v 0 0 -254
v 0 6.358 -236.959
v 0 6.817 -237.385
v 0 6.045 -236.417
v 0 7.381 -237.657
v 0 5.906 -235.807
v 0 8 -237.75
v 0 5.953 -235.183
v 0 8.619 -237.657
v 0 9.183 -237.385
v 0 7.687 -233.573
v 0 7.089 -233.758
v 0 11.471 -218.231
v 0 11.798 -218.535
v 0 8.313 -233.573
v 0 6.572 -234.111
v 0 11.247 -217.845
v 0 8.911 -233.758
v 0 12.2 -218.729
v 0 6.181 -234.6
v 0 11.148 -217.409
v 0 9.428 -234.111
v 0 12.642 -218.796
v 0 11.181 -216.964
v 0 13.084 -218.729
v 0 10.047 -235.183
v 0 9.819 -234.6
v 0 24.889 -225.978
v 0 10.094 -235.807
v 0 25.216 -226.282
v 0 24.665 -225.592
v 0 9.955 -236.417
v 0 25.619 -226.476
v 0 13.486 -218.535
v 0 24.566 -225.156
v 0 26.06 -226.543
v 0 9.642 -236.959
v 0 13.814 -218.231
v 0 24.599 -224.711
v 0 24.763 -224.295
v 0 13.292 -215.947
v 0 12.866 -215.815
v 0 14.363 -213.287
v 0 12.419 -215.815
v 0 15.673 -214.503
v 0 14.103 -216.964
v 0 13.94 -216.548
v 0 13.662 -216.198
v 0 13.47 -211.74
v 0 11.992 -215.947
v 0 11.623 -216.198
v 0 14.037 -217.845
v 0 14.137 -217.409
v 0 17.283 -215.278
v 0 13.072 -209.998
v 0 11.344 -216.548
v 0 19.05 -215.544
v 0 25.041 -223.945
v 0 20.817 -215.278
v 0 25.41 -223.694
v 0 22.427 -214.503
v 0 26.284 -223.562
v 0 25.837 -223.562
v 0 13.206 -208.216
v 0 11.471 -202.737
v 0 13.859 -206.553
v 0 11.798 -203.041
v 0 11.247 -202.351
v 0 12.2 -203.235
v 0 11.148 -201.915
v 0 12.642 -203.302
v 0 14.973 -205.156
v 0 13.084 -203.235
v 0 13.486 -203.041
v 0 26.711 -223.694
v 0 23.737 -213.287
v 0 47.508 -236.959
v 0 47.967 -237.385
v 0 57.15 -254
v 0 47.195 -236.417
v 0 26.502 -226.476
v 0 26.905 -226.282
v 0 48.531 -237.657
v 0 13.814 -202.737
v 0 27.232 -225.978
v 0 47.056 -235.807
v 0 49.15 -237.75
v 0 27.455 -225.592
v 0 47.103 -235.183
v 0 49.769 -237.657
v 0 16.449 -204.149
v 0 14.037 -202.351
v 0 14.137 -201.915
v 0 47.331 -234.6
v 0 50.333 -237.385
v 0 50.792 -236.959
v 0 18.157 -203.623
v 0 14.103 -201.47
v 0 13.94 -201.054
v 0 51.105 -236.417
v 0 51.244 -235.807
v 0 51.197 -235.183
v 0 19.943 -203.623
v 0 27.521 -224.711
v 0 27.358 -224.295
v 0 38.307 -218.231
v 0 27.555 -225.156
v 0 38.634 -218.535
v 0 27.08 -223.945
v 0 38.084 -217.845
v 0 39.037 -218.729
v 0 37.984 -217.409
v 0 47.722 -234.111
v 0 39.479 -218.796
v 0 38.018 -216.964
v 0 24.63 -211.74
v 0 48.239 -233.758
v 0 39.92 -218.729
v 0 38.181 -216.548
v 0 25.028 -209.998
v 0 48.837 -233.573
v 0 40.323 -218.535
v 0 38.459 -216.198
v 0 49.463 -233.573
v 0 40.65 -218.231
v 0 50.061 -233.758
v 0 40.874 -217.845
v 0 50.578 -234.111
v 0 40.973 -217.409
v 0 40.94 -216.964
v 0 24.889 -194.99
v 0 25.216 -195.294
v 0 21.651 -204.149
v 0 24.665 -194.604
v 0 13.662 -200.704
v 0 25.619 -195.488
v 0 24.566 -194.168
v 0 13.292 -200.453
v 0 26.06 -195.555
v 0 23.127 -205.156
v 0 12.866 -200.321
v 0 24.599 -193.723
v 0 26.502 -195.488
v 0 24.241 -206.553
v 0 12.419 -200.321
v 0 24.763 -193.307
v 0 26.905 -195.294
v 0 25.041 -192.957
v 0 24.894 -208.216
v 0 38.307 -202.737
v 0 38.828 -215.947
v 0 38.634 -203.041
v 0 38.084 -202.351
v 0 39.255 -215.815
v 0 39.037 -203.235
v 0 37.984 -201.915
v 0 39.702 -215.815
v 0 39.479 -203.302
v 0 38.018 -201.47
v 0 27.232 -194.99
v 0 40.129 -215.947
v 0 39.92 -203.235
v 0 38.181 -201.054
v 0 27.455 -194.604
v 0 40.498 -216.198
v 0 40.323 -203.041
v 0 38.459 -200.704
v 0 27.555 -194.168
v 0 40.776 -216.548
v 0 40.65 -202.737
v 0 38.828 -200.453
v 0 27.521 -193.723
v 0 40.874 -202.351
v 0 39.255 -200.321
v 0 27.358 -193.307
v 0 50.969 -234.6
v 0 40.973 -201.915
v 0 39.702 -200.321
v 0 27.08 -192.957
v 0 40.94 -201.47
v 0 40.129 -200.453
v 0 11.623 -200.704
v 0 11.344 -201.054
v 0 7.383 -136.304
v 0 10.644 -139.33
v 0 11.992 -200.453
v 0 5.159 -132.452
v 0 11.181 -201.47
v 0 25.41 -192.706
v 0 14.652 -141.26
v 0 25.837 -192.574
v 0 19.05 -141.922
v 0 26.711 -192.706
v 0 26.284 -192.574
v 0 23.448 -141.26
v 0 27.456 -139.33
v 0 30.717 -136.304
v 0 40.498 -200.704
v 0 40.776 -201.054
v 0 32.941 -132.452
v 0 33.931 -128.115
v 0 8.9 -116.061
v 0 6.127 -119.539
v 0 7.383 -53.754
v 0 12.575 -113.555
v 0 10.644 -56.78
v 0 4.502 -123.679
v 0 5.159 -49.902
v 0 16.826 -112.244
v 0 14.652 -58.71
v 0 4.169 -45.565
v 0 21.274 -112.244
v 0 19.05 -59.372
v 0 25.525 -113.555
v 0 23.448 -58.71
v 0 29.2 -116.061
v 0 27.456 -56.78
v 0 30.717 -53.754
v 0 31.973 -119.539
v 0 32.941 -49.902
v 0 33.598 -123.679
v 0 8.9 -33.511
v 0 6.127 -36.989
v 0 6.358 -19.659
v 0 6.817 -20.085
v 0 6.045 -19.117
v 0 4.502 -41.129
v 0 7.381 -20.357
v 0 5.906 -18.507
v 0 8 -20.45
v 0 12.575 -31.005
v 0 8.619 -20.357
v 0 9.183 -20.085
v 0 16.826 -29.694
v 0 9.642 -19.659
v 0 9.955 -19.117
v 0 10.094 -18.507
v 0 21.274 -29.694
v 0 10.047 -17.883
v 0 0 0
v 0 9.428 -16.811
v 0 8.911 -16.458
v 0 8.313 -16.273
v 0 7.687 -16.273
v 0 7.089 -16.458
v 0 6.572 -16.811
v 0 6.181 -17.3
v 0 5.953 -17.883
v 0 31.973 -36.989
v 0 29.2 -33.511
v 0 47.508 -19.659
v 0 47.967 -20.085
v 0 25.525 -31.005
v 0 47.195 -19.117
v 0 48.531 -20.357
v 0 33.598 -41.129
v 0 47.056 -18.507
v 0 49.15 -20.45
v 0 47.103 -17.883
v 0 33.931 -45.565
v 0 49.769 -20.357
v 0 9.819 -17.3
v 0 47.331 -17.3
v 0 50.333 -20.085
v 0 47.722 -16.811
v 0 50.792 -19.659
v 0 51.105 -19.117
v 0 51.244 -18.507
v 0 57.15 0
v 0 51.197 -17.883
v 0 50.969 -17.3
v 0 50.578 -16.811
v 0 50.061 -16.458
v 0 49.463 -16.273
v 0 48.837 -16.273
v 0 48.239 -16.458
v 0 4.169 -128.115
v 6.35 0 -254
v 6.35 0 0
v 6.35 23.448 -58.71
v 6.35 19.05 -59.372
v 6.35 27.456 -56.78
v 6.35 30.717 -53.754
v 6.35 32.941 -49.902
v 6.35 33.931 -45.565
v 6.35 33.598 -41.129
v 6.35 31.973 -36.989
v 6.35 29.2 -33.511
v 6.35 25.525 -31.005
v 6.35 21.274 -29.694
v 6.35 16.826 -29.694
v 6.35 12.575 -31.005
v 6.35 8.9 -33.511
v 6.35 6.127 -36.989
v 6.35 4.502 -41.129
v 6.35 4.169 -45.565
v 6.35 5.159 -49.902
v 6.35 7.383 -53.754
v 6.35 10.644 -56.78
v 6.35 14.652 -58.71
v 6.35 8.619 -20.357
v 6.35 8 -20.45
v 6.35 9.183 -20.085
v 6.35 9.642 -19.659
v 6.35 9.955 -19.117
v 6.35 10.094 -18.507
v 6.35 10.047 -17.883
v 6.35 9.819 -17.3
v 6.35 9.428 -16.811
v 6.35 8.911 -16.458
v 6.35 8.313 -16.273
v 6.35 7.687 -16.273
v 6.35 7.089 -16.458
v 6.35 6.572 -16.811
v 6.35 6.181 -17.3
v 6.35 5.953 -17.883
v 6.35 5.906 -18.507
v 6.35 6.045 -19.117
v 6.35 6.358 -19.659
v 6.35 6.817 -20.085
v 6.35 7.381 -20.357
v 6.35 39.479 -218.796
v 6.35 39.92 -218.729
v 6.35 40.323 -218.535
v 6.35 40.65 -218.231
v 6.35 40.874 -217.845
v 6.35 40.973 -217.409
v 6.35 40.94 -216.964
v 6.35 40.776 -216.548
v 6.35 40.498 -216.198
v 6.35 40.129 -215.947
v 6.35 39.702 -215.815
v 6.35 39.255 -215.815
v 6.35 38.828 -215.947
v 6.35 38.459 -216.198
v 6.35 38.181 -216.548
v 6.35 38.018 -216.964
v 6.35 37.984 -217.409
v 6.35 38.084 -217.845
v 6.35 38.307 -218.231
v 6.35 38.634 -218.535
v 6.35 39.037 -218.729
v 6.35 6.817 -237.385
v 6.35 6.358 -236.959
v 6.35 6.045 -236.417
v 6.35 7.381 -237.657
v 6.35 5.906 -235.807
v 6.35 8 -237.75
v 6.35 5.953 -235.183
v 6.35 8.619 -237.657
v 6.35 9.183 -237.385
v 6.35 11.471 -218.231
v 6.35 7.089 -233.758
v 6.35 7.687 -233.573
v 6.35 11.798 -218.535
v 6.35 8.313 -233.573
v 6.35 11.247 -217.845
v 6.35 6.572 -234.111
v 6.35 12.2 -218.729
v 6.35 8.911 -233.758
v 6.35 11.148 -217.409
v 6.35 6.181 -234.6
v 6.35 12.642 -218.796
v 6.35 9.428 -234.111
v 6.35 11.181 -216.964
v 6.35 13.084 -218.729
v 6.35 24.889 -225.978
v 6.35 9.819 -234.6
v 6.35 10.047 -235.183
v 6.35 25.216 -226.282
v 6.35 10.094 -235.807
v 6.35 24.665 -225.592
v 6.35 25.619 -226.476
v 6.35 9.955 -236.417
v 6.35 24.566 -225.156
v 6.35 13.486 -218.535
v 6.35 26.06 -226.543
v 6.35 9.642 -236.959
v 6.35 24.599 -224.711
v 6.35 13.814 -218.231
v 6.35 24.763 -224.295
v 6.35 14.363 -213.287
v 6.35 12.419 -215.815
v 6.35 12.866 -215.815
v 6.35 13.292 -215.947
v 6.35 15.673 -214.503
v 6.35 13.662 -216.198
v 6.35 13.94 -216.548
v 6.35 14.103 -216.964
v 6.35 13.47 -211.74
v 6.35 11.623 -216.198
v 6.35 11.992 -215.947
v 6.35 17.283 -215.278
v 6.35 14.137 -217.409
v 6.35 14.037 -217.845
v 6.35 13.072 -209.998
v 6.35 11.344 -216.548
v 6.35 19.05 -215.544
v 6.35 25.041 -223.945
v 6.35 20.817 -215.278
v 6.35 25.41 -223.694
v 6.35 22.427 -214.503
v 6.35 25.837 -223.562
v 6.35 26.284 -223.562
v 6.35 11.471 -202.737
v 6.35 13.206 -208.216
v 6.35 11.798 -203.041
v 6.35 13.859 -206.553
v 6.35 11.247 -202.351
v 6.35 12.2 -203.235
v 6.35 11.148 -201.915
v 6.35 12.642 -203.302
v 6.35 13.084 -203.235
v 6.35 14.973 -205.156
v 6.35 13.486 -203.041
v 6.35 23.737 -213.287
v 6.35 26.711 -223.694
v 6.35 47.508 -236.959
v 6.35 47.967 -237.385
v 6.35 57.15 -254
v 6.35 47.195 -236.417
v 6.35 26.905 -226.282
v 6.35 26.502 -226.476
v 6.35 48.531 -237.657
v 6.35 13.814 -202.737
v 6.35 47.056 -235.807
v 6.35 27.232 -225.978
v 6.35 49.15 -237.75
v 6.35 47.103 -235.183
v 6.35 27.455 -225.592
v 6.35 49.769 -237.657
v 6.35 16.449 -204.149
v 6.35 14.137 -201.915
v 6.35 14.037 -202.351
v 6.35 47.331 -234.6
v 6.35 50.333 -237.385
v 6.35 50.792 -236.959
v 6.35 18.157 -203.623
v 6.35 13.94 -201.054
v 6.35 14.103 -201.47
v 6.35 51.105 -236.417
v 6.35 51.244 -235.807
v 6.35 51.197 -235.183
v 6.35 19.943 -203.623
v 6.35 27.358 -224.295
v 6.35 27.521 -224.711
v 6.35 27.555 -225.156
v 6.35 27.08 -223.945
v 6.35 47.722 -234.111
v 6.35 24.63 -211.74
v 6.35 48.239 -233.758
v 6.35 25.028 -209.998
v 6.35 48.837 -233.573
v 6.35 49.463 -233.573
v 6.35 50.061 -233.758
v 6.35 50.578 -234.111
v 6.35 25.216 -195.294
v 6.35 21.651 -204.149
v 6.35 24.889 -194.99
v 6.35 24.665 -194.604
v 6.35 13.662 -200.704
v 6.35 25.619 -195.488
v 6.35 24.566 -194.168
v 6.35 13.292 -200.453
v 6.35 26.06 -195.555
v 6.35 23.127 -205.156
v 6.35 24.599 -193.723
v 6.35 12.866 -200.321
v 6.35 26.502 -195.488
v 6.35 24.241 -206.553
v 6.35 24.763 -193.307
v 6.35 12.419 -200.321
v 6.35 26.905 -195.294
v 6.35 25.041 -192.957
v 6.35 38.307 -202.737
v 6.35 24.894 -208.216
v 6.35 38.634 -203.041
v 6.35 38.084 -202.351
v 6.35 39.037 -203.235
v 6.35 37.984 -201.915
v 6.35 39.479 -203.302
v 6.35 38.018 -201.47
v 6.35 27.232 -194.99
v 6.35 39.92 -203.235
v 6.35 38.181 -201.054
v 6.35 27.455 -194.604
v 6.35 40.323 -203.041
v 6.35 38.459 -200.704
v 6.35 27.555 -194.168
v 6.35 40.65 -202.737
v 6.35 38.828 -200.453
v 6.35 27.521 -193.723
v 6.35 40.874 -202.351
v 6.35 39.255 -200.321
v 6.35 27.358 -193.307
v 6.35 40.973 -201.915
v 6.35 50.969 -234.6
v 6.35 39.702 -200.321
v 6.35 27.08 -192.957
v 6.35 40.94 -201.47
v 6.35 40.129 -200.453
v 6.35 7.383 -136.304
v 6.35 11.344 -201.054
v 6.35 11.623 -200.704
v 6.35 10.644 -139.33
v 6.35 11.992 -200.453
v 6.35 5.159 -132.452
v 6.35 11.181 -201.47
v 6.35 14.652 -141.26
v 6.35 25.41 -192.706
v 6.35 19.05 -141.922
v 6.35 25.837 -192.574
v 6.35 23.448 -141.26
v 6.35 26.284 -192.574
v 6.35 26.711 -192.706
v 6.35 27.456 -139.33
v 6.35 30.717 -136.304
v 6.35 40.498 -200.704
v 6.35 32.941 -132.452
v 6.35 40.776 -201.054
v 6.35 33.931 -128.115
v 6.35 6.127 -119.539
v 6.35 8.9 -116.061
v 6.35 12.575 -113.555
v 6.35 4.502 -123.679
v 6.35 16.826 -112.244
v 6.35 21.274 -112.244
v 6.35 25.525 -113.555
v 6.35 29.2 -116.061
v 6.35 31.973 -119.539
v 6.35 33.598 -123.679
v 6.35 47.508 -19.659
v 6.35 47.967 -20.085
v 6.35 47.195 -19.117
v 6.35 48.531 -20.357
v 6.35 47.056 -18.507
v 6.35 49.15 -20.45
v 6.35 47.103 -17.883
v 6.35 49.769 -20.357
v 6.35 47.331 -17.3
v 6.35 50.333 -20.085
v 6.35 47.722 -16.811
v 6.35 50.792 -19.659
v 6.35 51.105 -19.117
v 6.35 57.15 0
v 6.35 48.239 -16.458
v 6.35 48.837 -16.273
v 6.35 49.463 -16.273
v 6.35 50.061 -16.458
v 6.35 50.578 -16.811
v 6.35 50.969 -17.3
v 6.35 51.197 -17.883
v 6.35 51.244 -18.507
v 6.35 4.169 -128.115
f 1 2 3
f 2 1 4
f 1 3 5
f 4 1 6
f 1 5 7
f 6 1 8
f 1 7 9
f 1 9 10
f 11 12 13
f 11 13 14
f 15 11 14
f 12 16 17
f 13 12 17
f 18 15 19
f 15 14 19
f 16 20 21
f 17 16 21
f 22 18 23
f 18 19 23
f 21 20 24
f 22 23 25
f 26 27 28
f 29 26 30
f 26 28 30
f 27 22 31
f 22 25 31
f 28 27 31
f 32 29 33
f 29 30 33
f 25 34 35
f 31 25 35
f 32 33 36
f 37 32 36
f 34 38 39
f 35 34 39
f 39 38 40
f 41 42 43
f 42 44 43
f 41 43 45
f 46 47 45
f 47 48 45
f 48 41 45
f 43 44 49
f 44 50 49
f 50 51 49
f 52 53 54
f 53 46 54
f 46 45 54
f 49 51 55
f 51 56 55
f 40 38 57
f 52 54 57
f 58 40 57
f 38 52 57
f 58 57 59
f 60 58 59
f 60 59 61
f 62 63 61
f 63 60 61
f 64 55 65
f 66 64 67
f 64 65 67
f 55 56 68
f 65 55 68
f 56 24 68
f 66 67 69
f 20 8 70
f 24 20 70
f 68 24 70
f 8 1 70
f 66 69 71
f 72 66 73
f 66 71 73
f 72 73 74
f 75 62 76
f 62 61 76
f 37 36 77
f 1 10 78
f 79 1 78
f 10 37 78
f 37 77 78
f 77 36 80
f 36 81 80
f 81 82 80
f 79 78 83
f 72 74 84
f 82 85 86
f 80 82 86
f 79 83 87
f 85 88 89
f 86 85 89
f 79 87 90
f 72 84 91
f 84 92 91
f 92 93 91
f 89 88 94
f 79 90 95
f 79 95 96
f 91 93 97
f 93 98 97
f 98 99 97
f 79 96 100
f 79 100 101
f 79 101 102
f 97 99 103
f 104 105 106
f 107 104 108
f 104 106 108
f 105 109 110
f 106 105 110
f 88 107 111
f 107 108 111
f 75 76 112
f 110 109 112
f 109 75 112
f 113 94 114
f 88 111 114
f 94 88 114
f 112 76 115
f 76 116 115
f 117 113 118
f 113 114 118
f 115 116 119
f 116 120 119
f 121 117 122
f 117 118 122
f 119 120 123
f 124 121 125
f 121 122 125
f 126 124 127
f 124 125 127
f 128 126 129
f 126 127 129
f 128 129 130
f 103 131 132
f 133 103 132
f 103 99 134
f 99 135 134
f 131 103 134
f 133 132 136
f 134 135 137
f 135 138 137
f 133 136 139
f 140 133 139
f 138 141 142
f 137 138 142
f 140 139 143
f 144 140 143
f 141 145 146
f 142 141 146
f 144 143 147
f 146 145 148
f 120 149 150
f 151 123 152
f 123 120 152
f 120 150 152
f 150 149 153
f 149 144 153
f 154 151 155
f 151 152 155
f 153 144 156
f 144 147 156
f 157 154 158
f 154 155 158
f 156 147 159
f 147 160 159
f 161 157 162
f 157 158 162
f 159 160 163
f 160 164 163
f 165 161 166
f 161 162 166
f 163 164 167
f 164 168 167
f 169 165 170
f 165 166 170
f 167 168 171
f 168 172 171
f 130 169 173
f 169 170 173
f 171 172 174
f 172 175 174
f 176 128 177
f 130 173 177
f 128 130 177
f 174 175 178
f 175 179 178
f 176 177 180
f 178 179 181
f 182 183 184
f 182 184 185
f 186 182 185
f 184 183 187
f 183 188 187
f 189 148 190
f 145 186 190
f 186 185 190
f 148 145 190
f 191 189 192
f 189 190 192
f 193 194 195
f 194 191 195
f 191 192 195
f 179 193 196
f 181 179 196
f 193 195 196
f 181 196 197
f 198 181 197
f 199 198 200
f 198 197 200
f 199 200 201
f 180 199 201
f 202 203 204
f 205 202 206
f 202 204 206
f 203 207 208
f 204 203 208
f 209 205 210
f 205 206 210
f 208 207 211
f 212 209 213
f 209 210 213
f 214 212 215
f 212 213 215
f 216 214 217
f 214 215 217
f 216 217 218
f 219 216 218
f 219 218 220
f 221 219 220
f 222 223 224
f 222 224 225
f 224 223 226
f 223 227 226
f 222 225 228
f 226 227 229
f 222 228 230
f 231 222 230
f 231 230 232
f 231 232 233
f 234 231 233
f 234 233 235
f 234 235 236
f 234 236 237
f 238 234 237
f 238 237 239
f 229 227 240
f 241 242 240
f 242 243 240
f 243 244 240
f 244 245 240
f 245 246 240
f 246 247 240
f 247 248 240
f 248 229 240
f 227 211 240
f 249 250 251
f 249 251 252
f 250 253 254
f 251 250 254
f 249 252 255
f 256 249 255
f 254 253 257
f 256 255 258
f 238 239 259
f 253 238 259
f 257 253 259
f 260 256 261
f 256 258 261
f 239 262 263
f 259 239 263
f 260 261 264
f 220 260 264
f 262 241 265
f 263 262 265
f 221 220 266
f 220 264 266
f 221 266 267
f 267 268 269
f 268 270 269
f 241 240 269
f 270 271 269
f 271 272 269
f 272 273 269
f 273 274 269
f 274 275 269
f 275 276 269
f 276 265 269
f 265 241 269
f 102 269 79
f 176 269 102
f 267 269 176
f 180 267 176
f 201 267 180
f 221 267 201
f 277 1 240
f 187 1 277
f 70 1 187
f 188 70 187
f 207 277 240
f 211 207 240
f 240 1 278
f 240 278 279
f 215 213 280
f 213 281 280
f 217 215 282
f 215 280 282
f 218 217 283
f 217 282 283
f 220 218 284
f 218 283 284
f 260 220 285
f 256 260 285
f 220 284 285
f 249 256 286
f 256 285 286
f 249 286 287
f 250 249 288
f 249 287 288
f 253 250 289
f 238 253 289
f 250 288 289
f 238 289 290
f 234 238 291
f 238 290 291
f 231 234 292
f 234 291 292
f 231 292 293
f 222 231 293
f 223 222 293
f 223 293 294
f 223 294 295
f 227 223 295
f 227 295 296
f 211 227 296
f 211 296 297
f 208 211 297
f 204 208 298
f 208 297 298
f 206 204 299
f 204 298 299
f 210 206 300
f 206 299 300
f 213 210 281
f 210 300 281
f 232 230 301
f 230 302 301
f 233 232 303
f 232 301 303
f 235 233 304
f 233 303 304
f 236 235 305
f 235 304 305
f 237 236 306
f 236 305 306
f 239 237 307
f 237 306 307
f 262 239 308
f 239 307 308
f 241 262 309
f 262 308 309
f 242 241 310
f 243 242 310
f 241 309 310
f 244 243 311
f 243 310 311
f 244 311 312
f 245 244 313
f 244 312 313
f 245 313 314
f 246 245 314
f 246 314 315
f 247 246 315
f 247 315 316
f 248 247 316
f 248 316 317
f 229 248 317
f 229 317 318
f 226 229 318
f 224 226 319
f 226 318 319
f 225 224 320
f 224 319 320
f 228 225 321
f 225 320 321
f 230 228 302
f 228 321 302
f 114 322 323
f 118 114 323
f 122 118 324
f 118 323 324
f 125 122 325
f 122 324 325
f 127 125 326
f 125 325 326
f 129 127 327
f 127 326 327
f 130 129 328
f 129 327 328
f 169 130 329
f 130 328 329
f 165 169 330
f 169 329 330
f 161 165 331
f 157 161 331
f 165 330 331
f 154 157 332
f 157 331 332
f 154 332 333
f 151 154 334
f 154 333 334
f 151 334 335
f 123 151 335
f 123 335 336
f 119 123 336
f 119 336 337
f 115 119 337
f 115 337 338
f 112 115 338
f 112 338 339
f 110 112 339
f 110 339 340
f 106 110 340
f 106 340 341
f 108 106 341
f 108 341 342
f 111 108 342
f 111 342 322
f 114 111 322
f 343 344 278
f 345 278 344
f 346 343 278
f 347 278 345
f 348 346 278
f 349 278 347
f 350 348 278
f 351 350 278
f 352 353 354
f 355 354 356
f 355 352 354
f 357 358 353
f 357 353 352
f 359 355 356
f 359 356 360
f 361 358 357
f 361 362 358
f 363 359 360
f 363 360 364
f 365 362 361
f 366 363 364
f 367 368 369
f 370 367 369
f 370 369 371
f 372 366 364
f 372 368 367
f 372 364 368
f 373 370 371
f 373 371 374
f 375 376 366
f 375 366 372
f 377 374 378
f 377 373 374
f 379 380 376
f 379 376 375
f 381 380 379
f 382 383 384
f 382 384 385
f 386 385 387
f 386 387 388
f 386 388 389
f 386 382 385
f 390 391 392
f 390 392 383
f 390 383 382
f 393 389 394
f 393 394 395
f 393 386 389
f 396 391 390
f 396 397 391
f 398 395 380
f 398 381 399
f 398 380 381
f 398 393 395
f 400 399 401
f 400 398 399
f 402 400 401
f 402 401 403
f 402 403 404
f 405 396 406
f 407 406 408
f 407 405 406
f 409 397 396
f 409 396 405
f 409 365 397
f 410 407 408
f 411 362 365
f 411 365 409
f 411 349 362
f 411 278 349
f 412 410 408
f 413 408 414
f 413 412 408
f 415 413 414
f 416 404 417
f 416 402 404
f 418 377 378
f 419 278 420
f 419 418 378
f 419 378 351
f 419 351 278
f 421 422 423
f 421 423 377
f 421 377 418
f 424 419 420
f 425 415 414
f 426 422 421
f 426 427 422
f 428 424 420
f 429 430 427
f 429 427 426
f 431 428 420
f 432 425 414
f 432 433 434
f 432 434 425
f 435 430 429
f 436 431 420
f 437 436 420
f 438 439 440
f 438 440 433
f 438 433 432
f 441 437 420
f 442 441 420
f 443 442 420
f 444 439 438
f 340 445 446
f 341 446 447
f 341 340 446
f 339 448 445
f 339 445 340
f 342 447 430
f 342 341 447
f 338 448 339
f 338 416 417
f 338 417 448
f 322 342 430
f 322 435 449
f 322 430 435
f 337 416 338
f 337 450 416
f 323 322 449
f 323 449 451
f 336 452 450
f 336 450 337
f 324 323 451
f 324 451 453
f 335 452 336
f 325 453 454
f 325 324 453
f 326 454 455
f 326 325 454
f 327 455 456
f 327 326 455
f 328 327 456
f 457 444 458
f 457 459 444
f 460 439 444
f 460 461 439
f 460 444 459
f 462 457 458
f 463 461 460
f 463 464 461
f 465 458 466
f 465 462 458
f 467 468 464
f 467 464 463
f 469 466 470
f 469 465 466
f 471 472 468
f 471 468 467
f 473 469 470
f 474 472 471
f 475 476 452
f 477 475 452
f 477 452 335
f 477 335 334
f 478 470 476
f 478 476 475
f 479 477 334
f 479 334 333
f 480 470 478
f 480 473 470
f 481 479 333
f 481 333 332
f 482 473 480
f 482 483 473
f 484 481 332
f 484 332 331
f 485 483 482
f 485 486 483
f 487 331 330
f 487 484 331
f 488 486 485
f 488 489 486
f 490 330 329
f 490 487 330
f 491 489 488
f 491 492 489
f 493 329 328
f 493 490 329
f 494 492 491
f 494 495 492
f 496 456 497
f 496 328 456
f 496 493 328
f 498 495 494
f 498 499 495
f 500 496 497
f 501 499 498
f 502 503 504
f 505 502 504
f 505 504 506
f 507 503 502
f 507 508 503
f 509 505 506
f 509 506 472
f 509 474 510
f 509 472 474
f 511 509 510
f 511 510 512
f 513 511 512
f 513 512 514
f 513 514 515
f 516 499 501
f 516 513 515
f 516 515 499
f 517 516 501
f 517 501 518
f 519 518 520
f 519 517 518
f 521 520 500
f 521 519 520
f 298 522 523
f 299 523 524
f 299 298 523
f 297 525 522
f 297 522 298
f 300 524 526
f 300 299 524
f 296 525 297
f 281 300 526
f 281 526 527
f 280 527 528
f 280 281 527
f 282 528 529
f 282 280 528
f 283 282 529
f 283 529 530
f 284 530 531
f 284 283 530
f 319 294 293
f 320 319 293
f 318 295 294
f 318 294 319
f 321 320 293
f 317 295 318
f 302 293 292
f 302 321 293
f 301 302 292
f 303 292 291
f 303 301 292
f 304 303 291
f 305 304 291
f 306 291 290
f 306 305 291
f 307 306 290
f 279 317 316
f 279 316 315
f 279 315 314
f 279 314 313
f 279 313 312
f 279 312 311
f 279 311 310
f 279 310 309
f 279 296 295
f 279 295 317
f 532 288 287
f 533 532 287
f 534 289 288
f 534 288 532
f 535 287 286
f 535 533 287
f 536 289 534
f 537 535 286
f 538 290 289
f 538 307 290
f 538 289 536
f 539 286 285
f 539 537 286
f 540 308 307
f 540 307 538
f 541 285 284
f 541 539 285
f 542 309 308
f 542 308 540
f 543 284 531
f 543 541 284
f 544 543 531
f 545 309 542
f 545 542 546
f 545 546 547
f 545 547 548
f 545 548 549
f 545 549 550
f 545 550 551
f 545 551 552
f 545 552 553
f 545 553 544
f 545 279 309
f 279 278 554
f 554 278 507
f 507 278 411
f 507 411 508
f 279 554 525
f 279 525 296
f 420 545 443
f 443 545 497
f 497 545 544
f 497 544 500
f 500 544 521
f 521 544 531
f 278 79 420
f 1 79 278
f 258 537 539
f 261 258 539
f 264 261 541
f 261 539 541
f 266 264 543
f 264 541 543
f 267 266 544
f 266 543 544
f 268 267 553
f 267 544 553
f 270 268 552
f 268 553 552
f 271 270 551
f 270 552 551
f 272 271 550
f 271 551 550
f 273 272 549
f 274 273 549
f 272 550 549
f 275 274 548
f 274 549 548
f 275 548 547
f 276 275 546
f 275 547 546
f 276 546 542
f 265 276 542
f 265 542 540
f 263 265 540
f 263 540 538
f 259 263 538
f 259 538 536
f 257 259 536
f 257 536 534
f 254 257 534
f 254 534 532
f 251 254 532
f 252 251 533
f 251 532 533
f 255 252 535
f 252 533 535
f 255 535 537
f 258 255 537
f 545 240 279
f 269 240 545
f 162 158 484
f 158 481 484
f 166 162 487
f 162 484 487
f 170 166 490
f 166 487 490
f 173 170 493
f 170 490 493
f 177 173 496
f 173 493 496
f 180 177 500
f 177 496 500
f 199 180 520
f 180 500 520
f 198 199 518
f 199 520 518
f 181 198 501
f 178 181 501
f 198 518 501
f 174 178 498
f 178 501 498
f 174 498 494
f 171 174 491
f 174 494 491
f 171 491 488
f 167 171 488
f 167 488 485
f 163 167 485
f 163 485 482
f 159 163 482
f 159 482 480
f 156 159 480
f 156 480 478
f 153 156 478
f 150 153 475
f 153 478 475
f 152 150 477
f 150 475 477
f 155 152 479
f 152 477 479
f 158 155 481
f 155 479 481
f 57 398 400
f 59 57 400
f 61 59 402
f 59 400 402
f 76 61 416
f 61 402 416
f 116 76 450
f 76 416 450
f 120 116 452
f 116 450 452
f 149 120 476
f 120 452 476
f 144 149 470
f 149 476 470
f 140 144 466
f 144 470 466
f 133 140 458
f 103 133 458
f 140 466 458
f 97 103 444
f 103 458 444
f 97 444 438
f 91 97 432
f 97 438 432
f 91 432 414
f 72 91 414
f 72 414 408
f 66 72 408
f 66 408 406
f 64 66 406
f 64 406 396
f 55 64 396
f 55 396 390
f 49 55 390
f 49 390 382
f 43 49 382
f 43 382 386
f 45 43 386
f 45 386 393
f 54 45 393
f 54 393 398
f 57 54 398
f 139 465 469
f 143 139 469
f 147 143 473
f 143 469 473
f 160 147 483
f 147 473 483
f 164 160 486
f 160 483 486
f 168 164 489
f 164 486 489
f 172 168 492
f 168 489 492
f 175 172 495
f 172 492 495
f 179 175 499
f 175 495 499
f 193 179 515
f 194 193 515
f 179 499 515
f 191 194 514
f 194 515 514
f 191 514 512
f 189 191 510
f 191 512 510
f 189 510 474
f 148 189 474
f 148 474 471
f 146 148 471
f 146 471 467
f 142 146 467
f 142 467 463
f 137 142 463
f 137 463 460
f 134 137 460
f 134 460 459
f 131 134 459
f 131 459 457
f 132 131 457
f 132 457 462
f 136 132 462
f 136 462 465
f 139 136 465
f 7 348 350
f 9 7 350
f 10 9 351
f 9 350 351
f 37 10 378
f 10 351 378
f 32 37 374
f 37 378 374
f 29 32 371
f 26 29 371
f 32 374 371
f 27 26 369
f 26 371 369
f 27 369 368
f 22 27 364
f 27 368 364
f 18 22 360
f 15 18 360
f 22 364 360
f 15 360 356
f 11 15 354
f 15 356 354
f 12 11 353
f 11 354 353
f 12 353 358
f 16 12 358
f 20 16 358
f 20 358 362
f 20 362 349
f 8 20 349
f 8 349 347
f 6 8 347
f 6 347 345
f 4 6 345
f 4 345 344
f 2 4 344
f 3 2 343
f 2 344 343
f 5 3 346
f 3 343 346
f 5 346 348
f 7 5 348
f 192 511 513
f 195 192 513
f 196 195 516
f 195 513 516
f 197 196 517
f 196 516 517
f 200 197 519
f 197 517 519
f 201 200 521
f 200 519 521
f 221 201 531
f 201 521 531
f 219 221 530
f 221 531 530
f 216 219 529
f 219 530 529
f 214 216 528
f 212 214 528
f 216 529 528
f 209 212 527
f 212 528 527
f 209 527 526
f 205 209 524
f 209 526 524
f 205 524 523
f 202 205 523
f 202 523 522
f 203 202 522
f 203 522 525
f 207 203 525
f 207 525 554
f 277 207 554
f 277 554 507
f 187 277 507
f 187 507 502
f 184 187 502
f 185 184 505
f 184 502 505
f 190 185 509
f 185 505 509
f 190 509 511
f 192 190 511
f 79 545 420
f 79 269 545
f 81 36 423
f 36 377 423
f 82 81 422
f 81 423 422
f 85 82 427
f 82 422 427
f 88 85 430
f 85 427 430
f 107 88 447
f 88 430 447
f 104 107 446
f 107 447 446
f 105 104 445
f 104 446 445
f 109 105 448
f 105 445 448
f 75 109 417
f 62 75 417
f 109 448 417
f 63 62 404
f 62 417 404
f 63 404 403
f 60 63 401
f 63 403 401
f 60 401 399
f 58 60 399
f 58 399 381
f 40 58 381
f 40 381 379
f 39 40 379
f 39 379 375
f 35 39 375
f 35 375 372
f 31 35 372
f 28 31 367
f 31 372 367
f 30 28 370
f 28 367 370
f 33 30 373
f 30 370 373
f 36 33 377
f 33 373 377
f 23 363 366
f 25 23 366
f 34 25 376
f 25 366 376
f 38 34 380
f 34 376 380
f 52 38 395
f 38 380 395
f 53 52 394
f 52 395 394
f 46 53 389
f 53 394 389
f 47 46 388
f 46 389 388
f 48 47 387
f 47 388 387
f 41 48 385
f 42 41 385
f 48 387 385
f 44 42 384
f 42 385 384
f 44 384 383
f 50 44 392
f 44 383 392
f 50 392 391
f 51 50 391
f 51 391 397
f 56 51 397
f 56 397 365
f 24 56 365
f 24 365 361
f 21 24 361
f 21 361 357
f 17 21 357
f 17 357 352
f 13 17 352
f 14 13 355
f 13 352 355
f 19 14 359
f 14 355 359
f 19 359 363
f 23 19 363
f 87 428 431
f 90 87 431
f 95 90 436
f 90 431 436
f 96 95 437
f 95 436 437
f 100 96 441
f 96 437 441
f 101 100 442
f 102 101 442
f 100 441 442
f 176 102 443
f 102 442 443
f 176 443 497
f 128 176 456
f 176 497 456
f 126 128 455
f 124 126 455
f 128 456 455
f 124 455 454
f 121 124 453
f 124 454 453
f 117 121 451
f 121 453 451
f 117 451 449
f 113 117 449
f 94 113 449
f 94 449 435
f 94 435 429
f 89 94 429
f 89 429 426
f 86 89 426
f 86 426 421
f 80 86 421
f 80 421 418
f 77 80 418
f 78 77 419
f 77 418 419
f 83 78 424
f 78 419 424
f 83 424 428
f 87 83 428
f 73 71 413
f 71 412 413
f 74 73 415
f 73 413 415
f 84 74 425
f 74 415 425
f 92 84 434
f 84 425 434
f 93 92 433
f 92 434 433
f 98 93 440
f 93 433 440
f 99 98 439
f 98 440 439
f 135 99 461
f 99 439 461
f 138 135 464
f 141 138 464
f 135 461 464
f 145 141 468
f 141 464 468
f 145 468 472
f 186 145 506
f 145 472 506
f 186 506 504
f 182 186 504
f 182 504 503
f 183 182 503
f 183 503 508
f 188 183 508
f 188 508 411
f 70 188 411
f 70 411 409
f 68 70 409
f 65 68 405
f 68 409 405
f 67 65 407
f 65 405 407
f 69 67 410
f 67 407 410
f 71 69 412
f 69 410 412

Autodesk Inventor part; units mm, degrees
ref_plane "YZ Plane" through (0, 0, 0) normal (1, 0, 0) x (0, 1, 0)
ref_plane "XZ Plane" through (0, 0, 0) normal (0, 1, 0) x (-1, 0, 0)
ref_plane "XY Plane" through (0, 0, 0) normal (0, 0, 1) x (1, 0, 0)
sketch "Sketch1" plane through (0, 0, 0) normal (1, 0, 0) x (0, 1, 0)
  line L0 (0, 0) -> (57.15, 0)
  line L1 (57.15, 0) -> (57.15, -254)
  line L2 (57.15, -254) -> (0, -254)
  line L3 (0, -254) -> (0, 0)
  dimension "d0" = 57.15
  dimension "d1" = 254
extrude "Extrusion1" add sketch "Sketch1" along normal blind 6.35
sketch "Sketch2" plane through (6.35, 0, 0) normal (1, 0, 0) x (0, 0, -1)
  line L0 (254, 57.15) -> (0, 57.15) projected
  circle A0 centre (209.55, 19.05) radius 5.9944
  line L1 (209.55, 19.05) -> (209.55, 26.0604)
  circle A1 centre (209.55, 26.0604) radius 15.494
  circle A2 centre (225.044, 26.0604) radius 1.4986
  circle A3 centre (217.297, 39.4786) radius 1.4986
  circle A4 centre (201.803, 39.4786) radius 1.4986
  circle A5 centre (194.056, 26.0604) radius 1.4986
  circle A6 centre (201.803, 12.6422) radius 1.4986
  circle A7 centre (217.297, 12.6422) radius 1.4986
  line L2 (209.55, 13.0556) -> (0, 13.0556)
  line L3 (0, 57.15) -> (0, 0) projected
  line L4 (0, 0) -> (254, 0) projected
  dimension "d7" = 11.9888
  dimension "d9" = 7.0104
  dimension "d10" = 30.988
  dimension "d11" = 2.9972
  dimension "d14" = 360
  dimension "d28" = 209.55
  dimension "d49" = 13.0556
extrude "Extrusion2" cut sketch "Sketch2" against normal through all contours A0 | A6 A1 L2 | L2 A1 A6 | A1 L2 A6 | A1 A6 L2 | A5 A1 | A1 A5 | A7 A1 | A1 A7 | A4 A1 | A1 A4 | A2 A1 | A1 A2 | A3 A1 | A1 A3
sketch "Sketch3" plane through (6.35, 0, 0) normal (1, 0, 0) x (0, 0, -1)
  circle A0 centre (209.55, 19.05) radius 5.9944 projected
  circle A1 centre (201.803, 12.6422) radius 1.4986 projected
  circle A2 centre (201.803, 39.4786) radius 1.4986 projected
  circle A3 centre (225.044, 26.0604) radius 1.4986 projected
  circle A4 centre (217.297, 39.4786) radius 1.4986 projected
  circle A5 centre (194.056, 26.0604) radius 1.4986 projected
  circle A6 centre (217.297, 12.6422) radius 1.4986 projected
  line L0 (0, 57.15) -> (0, 0) projected
  line L1 (0, 0) -> (254, 0) projected
  line L2 (254, 0) -> (254, 57.15) projected
  line L3 (254, 57.15) -> (0, 57.15) projected
  line L4 (209.55, 19.05) -> (127, 19.05)
  circle A7 centre (127, 19.05) radius 14.9225
  circle A8 centre (127, 19.05) radius 36.5125
  line L5 (127, 19.05) -> (44.45, 19.05)
  circle A9 centre (44.45, 19.05) radius 14.9225
  dimension "d18" = 82.55
  dimension "d19" = 29.845
  dimension "d27" = 73.025
  dimension "d29" = 82.55
  dimension "d30" = 29.845
extrude "Extrusion3" cut sketch "Sketch3" against normal through all contours A9 | A7 L5 L4 | L4 L5 A7
sketch "Sketch4" plane through (6.35, 0, 0) normal (1, 0, 0) x (0, 0, -1)
  line L0 (0, 57.15) -> (0, 0) projected
  line L1 (254, 0) -> (254, 57.15) projected
  line L2 (0, 57.15) -> (6.35, 57.15)
  line L3 (6.35, 57.15) -> (18.35, 57.15)
  line L4 (18.35, 57.15) -> (18.35, 49.15)
  circle A0 centre (18.35, 49.15) radius 2.1
  line L5 (6.35, 0) -> (18.35, 0)
  line L6 (18.35, 0) -> (18.35, 8)
  circle A1 centre (18.35, 8) radius 2.1
  line L7 (254, 57.15) -> (247.65, 57.15)
  line L8 (247.65, 57.15) -> (235.65, 57.15)
  line L9 (247.65, 0) -> (235.65, 0)
  circle A2 centre (235.65, 49.15) radius 2.1
  circle A3 centre (235.65, 8) radius 2.1
  line L10 (254, 57.15) -> (0, 57.15) projected
  dimension "d31" = 6.35
  dimension "d32" = 12
  dimension "d33" = 8
  dimension "d34" = 4.2
  dimension "d35" = 12
  dimension "d36" = 8
  dimension "d37" = 4.2
  dimension "d38" = 6.35
  dimension "d39" = 12
  dimension "d41" = 12
  dimension "d43" = 4.2
  dimension "d44" = 4.2
  dimension "d45" = 6.35
  dimension "d46" = 6.35
extrude "Extrusion4" cut sketch "Sketch4" against normal through all
properties part number "DriveRail"
